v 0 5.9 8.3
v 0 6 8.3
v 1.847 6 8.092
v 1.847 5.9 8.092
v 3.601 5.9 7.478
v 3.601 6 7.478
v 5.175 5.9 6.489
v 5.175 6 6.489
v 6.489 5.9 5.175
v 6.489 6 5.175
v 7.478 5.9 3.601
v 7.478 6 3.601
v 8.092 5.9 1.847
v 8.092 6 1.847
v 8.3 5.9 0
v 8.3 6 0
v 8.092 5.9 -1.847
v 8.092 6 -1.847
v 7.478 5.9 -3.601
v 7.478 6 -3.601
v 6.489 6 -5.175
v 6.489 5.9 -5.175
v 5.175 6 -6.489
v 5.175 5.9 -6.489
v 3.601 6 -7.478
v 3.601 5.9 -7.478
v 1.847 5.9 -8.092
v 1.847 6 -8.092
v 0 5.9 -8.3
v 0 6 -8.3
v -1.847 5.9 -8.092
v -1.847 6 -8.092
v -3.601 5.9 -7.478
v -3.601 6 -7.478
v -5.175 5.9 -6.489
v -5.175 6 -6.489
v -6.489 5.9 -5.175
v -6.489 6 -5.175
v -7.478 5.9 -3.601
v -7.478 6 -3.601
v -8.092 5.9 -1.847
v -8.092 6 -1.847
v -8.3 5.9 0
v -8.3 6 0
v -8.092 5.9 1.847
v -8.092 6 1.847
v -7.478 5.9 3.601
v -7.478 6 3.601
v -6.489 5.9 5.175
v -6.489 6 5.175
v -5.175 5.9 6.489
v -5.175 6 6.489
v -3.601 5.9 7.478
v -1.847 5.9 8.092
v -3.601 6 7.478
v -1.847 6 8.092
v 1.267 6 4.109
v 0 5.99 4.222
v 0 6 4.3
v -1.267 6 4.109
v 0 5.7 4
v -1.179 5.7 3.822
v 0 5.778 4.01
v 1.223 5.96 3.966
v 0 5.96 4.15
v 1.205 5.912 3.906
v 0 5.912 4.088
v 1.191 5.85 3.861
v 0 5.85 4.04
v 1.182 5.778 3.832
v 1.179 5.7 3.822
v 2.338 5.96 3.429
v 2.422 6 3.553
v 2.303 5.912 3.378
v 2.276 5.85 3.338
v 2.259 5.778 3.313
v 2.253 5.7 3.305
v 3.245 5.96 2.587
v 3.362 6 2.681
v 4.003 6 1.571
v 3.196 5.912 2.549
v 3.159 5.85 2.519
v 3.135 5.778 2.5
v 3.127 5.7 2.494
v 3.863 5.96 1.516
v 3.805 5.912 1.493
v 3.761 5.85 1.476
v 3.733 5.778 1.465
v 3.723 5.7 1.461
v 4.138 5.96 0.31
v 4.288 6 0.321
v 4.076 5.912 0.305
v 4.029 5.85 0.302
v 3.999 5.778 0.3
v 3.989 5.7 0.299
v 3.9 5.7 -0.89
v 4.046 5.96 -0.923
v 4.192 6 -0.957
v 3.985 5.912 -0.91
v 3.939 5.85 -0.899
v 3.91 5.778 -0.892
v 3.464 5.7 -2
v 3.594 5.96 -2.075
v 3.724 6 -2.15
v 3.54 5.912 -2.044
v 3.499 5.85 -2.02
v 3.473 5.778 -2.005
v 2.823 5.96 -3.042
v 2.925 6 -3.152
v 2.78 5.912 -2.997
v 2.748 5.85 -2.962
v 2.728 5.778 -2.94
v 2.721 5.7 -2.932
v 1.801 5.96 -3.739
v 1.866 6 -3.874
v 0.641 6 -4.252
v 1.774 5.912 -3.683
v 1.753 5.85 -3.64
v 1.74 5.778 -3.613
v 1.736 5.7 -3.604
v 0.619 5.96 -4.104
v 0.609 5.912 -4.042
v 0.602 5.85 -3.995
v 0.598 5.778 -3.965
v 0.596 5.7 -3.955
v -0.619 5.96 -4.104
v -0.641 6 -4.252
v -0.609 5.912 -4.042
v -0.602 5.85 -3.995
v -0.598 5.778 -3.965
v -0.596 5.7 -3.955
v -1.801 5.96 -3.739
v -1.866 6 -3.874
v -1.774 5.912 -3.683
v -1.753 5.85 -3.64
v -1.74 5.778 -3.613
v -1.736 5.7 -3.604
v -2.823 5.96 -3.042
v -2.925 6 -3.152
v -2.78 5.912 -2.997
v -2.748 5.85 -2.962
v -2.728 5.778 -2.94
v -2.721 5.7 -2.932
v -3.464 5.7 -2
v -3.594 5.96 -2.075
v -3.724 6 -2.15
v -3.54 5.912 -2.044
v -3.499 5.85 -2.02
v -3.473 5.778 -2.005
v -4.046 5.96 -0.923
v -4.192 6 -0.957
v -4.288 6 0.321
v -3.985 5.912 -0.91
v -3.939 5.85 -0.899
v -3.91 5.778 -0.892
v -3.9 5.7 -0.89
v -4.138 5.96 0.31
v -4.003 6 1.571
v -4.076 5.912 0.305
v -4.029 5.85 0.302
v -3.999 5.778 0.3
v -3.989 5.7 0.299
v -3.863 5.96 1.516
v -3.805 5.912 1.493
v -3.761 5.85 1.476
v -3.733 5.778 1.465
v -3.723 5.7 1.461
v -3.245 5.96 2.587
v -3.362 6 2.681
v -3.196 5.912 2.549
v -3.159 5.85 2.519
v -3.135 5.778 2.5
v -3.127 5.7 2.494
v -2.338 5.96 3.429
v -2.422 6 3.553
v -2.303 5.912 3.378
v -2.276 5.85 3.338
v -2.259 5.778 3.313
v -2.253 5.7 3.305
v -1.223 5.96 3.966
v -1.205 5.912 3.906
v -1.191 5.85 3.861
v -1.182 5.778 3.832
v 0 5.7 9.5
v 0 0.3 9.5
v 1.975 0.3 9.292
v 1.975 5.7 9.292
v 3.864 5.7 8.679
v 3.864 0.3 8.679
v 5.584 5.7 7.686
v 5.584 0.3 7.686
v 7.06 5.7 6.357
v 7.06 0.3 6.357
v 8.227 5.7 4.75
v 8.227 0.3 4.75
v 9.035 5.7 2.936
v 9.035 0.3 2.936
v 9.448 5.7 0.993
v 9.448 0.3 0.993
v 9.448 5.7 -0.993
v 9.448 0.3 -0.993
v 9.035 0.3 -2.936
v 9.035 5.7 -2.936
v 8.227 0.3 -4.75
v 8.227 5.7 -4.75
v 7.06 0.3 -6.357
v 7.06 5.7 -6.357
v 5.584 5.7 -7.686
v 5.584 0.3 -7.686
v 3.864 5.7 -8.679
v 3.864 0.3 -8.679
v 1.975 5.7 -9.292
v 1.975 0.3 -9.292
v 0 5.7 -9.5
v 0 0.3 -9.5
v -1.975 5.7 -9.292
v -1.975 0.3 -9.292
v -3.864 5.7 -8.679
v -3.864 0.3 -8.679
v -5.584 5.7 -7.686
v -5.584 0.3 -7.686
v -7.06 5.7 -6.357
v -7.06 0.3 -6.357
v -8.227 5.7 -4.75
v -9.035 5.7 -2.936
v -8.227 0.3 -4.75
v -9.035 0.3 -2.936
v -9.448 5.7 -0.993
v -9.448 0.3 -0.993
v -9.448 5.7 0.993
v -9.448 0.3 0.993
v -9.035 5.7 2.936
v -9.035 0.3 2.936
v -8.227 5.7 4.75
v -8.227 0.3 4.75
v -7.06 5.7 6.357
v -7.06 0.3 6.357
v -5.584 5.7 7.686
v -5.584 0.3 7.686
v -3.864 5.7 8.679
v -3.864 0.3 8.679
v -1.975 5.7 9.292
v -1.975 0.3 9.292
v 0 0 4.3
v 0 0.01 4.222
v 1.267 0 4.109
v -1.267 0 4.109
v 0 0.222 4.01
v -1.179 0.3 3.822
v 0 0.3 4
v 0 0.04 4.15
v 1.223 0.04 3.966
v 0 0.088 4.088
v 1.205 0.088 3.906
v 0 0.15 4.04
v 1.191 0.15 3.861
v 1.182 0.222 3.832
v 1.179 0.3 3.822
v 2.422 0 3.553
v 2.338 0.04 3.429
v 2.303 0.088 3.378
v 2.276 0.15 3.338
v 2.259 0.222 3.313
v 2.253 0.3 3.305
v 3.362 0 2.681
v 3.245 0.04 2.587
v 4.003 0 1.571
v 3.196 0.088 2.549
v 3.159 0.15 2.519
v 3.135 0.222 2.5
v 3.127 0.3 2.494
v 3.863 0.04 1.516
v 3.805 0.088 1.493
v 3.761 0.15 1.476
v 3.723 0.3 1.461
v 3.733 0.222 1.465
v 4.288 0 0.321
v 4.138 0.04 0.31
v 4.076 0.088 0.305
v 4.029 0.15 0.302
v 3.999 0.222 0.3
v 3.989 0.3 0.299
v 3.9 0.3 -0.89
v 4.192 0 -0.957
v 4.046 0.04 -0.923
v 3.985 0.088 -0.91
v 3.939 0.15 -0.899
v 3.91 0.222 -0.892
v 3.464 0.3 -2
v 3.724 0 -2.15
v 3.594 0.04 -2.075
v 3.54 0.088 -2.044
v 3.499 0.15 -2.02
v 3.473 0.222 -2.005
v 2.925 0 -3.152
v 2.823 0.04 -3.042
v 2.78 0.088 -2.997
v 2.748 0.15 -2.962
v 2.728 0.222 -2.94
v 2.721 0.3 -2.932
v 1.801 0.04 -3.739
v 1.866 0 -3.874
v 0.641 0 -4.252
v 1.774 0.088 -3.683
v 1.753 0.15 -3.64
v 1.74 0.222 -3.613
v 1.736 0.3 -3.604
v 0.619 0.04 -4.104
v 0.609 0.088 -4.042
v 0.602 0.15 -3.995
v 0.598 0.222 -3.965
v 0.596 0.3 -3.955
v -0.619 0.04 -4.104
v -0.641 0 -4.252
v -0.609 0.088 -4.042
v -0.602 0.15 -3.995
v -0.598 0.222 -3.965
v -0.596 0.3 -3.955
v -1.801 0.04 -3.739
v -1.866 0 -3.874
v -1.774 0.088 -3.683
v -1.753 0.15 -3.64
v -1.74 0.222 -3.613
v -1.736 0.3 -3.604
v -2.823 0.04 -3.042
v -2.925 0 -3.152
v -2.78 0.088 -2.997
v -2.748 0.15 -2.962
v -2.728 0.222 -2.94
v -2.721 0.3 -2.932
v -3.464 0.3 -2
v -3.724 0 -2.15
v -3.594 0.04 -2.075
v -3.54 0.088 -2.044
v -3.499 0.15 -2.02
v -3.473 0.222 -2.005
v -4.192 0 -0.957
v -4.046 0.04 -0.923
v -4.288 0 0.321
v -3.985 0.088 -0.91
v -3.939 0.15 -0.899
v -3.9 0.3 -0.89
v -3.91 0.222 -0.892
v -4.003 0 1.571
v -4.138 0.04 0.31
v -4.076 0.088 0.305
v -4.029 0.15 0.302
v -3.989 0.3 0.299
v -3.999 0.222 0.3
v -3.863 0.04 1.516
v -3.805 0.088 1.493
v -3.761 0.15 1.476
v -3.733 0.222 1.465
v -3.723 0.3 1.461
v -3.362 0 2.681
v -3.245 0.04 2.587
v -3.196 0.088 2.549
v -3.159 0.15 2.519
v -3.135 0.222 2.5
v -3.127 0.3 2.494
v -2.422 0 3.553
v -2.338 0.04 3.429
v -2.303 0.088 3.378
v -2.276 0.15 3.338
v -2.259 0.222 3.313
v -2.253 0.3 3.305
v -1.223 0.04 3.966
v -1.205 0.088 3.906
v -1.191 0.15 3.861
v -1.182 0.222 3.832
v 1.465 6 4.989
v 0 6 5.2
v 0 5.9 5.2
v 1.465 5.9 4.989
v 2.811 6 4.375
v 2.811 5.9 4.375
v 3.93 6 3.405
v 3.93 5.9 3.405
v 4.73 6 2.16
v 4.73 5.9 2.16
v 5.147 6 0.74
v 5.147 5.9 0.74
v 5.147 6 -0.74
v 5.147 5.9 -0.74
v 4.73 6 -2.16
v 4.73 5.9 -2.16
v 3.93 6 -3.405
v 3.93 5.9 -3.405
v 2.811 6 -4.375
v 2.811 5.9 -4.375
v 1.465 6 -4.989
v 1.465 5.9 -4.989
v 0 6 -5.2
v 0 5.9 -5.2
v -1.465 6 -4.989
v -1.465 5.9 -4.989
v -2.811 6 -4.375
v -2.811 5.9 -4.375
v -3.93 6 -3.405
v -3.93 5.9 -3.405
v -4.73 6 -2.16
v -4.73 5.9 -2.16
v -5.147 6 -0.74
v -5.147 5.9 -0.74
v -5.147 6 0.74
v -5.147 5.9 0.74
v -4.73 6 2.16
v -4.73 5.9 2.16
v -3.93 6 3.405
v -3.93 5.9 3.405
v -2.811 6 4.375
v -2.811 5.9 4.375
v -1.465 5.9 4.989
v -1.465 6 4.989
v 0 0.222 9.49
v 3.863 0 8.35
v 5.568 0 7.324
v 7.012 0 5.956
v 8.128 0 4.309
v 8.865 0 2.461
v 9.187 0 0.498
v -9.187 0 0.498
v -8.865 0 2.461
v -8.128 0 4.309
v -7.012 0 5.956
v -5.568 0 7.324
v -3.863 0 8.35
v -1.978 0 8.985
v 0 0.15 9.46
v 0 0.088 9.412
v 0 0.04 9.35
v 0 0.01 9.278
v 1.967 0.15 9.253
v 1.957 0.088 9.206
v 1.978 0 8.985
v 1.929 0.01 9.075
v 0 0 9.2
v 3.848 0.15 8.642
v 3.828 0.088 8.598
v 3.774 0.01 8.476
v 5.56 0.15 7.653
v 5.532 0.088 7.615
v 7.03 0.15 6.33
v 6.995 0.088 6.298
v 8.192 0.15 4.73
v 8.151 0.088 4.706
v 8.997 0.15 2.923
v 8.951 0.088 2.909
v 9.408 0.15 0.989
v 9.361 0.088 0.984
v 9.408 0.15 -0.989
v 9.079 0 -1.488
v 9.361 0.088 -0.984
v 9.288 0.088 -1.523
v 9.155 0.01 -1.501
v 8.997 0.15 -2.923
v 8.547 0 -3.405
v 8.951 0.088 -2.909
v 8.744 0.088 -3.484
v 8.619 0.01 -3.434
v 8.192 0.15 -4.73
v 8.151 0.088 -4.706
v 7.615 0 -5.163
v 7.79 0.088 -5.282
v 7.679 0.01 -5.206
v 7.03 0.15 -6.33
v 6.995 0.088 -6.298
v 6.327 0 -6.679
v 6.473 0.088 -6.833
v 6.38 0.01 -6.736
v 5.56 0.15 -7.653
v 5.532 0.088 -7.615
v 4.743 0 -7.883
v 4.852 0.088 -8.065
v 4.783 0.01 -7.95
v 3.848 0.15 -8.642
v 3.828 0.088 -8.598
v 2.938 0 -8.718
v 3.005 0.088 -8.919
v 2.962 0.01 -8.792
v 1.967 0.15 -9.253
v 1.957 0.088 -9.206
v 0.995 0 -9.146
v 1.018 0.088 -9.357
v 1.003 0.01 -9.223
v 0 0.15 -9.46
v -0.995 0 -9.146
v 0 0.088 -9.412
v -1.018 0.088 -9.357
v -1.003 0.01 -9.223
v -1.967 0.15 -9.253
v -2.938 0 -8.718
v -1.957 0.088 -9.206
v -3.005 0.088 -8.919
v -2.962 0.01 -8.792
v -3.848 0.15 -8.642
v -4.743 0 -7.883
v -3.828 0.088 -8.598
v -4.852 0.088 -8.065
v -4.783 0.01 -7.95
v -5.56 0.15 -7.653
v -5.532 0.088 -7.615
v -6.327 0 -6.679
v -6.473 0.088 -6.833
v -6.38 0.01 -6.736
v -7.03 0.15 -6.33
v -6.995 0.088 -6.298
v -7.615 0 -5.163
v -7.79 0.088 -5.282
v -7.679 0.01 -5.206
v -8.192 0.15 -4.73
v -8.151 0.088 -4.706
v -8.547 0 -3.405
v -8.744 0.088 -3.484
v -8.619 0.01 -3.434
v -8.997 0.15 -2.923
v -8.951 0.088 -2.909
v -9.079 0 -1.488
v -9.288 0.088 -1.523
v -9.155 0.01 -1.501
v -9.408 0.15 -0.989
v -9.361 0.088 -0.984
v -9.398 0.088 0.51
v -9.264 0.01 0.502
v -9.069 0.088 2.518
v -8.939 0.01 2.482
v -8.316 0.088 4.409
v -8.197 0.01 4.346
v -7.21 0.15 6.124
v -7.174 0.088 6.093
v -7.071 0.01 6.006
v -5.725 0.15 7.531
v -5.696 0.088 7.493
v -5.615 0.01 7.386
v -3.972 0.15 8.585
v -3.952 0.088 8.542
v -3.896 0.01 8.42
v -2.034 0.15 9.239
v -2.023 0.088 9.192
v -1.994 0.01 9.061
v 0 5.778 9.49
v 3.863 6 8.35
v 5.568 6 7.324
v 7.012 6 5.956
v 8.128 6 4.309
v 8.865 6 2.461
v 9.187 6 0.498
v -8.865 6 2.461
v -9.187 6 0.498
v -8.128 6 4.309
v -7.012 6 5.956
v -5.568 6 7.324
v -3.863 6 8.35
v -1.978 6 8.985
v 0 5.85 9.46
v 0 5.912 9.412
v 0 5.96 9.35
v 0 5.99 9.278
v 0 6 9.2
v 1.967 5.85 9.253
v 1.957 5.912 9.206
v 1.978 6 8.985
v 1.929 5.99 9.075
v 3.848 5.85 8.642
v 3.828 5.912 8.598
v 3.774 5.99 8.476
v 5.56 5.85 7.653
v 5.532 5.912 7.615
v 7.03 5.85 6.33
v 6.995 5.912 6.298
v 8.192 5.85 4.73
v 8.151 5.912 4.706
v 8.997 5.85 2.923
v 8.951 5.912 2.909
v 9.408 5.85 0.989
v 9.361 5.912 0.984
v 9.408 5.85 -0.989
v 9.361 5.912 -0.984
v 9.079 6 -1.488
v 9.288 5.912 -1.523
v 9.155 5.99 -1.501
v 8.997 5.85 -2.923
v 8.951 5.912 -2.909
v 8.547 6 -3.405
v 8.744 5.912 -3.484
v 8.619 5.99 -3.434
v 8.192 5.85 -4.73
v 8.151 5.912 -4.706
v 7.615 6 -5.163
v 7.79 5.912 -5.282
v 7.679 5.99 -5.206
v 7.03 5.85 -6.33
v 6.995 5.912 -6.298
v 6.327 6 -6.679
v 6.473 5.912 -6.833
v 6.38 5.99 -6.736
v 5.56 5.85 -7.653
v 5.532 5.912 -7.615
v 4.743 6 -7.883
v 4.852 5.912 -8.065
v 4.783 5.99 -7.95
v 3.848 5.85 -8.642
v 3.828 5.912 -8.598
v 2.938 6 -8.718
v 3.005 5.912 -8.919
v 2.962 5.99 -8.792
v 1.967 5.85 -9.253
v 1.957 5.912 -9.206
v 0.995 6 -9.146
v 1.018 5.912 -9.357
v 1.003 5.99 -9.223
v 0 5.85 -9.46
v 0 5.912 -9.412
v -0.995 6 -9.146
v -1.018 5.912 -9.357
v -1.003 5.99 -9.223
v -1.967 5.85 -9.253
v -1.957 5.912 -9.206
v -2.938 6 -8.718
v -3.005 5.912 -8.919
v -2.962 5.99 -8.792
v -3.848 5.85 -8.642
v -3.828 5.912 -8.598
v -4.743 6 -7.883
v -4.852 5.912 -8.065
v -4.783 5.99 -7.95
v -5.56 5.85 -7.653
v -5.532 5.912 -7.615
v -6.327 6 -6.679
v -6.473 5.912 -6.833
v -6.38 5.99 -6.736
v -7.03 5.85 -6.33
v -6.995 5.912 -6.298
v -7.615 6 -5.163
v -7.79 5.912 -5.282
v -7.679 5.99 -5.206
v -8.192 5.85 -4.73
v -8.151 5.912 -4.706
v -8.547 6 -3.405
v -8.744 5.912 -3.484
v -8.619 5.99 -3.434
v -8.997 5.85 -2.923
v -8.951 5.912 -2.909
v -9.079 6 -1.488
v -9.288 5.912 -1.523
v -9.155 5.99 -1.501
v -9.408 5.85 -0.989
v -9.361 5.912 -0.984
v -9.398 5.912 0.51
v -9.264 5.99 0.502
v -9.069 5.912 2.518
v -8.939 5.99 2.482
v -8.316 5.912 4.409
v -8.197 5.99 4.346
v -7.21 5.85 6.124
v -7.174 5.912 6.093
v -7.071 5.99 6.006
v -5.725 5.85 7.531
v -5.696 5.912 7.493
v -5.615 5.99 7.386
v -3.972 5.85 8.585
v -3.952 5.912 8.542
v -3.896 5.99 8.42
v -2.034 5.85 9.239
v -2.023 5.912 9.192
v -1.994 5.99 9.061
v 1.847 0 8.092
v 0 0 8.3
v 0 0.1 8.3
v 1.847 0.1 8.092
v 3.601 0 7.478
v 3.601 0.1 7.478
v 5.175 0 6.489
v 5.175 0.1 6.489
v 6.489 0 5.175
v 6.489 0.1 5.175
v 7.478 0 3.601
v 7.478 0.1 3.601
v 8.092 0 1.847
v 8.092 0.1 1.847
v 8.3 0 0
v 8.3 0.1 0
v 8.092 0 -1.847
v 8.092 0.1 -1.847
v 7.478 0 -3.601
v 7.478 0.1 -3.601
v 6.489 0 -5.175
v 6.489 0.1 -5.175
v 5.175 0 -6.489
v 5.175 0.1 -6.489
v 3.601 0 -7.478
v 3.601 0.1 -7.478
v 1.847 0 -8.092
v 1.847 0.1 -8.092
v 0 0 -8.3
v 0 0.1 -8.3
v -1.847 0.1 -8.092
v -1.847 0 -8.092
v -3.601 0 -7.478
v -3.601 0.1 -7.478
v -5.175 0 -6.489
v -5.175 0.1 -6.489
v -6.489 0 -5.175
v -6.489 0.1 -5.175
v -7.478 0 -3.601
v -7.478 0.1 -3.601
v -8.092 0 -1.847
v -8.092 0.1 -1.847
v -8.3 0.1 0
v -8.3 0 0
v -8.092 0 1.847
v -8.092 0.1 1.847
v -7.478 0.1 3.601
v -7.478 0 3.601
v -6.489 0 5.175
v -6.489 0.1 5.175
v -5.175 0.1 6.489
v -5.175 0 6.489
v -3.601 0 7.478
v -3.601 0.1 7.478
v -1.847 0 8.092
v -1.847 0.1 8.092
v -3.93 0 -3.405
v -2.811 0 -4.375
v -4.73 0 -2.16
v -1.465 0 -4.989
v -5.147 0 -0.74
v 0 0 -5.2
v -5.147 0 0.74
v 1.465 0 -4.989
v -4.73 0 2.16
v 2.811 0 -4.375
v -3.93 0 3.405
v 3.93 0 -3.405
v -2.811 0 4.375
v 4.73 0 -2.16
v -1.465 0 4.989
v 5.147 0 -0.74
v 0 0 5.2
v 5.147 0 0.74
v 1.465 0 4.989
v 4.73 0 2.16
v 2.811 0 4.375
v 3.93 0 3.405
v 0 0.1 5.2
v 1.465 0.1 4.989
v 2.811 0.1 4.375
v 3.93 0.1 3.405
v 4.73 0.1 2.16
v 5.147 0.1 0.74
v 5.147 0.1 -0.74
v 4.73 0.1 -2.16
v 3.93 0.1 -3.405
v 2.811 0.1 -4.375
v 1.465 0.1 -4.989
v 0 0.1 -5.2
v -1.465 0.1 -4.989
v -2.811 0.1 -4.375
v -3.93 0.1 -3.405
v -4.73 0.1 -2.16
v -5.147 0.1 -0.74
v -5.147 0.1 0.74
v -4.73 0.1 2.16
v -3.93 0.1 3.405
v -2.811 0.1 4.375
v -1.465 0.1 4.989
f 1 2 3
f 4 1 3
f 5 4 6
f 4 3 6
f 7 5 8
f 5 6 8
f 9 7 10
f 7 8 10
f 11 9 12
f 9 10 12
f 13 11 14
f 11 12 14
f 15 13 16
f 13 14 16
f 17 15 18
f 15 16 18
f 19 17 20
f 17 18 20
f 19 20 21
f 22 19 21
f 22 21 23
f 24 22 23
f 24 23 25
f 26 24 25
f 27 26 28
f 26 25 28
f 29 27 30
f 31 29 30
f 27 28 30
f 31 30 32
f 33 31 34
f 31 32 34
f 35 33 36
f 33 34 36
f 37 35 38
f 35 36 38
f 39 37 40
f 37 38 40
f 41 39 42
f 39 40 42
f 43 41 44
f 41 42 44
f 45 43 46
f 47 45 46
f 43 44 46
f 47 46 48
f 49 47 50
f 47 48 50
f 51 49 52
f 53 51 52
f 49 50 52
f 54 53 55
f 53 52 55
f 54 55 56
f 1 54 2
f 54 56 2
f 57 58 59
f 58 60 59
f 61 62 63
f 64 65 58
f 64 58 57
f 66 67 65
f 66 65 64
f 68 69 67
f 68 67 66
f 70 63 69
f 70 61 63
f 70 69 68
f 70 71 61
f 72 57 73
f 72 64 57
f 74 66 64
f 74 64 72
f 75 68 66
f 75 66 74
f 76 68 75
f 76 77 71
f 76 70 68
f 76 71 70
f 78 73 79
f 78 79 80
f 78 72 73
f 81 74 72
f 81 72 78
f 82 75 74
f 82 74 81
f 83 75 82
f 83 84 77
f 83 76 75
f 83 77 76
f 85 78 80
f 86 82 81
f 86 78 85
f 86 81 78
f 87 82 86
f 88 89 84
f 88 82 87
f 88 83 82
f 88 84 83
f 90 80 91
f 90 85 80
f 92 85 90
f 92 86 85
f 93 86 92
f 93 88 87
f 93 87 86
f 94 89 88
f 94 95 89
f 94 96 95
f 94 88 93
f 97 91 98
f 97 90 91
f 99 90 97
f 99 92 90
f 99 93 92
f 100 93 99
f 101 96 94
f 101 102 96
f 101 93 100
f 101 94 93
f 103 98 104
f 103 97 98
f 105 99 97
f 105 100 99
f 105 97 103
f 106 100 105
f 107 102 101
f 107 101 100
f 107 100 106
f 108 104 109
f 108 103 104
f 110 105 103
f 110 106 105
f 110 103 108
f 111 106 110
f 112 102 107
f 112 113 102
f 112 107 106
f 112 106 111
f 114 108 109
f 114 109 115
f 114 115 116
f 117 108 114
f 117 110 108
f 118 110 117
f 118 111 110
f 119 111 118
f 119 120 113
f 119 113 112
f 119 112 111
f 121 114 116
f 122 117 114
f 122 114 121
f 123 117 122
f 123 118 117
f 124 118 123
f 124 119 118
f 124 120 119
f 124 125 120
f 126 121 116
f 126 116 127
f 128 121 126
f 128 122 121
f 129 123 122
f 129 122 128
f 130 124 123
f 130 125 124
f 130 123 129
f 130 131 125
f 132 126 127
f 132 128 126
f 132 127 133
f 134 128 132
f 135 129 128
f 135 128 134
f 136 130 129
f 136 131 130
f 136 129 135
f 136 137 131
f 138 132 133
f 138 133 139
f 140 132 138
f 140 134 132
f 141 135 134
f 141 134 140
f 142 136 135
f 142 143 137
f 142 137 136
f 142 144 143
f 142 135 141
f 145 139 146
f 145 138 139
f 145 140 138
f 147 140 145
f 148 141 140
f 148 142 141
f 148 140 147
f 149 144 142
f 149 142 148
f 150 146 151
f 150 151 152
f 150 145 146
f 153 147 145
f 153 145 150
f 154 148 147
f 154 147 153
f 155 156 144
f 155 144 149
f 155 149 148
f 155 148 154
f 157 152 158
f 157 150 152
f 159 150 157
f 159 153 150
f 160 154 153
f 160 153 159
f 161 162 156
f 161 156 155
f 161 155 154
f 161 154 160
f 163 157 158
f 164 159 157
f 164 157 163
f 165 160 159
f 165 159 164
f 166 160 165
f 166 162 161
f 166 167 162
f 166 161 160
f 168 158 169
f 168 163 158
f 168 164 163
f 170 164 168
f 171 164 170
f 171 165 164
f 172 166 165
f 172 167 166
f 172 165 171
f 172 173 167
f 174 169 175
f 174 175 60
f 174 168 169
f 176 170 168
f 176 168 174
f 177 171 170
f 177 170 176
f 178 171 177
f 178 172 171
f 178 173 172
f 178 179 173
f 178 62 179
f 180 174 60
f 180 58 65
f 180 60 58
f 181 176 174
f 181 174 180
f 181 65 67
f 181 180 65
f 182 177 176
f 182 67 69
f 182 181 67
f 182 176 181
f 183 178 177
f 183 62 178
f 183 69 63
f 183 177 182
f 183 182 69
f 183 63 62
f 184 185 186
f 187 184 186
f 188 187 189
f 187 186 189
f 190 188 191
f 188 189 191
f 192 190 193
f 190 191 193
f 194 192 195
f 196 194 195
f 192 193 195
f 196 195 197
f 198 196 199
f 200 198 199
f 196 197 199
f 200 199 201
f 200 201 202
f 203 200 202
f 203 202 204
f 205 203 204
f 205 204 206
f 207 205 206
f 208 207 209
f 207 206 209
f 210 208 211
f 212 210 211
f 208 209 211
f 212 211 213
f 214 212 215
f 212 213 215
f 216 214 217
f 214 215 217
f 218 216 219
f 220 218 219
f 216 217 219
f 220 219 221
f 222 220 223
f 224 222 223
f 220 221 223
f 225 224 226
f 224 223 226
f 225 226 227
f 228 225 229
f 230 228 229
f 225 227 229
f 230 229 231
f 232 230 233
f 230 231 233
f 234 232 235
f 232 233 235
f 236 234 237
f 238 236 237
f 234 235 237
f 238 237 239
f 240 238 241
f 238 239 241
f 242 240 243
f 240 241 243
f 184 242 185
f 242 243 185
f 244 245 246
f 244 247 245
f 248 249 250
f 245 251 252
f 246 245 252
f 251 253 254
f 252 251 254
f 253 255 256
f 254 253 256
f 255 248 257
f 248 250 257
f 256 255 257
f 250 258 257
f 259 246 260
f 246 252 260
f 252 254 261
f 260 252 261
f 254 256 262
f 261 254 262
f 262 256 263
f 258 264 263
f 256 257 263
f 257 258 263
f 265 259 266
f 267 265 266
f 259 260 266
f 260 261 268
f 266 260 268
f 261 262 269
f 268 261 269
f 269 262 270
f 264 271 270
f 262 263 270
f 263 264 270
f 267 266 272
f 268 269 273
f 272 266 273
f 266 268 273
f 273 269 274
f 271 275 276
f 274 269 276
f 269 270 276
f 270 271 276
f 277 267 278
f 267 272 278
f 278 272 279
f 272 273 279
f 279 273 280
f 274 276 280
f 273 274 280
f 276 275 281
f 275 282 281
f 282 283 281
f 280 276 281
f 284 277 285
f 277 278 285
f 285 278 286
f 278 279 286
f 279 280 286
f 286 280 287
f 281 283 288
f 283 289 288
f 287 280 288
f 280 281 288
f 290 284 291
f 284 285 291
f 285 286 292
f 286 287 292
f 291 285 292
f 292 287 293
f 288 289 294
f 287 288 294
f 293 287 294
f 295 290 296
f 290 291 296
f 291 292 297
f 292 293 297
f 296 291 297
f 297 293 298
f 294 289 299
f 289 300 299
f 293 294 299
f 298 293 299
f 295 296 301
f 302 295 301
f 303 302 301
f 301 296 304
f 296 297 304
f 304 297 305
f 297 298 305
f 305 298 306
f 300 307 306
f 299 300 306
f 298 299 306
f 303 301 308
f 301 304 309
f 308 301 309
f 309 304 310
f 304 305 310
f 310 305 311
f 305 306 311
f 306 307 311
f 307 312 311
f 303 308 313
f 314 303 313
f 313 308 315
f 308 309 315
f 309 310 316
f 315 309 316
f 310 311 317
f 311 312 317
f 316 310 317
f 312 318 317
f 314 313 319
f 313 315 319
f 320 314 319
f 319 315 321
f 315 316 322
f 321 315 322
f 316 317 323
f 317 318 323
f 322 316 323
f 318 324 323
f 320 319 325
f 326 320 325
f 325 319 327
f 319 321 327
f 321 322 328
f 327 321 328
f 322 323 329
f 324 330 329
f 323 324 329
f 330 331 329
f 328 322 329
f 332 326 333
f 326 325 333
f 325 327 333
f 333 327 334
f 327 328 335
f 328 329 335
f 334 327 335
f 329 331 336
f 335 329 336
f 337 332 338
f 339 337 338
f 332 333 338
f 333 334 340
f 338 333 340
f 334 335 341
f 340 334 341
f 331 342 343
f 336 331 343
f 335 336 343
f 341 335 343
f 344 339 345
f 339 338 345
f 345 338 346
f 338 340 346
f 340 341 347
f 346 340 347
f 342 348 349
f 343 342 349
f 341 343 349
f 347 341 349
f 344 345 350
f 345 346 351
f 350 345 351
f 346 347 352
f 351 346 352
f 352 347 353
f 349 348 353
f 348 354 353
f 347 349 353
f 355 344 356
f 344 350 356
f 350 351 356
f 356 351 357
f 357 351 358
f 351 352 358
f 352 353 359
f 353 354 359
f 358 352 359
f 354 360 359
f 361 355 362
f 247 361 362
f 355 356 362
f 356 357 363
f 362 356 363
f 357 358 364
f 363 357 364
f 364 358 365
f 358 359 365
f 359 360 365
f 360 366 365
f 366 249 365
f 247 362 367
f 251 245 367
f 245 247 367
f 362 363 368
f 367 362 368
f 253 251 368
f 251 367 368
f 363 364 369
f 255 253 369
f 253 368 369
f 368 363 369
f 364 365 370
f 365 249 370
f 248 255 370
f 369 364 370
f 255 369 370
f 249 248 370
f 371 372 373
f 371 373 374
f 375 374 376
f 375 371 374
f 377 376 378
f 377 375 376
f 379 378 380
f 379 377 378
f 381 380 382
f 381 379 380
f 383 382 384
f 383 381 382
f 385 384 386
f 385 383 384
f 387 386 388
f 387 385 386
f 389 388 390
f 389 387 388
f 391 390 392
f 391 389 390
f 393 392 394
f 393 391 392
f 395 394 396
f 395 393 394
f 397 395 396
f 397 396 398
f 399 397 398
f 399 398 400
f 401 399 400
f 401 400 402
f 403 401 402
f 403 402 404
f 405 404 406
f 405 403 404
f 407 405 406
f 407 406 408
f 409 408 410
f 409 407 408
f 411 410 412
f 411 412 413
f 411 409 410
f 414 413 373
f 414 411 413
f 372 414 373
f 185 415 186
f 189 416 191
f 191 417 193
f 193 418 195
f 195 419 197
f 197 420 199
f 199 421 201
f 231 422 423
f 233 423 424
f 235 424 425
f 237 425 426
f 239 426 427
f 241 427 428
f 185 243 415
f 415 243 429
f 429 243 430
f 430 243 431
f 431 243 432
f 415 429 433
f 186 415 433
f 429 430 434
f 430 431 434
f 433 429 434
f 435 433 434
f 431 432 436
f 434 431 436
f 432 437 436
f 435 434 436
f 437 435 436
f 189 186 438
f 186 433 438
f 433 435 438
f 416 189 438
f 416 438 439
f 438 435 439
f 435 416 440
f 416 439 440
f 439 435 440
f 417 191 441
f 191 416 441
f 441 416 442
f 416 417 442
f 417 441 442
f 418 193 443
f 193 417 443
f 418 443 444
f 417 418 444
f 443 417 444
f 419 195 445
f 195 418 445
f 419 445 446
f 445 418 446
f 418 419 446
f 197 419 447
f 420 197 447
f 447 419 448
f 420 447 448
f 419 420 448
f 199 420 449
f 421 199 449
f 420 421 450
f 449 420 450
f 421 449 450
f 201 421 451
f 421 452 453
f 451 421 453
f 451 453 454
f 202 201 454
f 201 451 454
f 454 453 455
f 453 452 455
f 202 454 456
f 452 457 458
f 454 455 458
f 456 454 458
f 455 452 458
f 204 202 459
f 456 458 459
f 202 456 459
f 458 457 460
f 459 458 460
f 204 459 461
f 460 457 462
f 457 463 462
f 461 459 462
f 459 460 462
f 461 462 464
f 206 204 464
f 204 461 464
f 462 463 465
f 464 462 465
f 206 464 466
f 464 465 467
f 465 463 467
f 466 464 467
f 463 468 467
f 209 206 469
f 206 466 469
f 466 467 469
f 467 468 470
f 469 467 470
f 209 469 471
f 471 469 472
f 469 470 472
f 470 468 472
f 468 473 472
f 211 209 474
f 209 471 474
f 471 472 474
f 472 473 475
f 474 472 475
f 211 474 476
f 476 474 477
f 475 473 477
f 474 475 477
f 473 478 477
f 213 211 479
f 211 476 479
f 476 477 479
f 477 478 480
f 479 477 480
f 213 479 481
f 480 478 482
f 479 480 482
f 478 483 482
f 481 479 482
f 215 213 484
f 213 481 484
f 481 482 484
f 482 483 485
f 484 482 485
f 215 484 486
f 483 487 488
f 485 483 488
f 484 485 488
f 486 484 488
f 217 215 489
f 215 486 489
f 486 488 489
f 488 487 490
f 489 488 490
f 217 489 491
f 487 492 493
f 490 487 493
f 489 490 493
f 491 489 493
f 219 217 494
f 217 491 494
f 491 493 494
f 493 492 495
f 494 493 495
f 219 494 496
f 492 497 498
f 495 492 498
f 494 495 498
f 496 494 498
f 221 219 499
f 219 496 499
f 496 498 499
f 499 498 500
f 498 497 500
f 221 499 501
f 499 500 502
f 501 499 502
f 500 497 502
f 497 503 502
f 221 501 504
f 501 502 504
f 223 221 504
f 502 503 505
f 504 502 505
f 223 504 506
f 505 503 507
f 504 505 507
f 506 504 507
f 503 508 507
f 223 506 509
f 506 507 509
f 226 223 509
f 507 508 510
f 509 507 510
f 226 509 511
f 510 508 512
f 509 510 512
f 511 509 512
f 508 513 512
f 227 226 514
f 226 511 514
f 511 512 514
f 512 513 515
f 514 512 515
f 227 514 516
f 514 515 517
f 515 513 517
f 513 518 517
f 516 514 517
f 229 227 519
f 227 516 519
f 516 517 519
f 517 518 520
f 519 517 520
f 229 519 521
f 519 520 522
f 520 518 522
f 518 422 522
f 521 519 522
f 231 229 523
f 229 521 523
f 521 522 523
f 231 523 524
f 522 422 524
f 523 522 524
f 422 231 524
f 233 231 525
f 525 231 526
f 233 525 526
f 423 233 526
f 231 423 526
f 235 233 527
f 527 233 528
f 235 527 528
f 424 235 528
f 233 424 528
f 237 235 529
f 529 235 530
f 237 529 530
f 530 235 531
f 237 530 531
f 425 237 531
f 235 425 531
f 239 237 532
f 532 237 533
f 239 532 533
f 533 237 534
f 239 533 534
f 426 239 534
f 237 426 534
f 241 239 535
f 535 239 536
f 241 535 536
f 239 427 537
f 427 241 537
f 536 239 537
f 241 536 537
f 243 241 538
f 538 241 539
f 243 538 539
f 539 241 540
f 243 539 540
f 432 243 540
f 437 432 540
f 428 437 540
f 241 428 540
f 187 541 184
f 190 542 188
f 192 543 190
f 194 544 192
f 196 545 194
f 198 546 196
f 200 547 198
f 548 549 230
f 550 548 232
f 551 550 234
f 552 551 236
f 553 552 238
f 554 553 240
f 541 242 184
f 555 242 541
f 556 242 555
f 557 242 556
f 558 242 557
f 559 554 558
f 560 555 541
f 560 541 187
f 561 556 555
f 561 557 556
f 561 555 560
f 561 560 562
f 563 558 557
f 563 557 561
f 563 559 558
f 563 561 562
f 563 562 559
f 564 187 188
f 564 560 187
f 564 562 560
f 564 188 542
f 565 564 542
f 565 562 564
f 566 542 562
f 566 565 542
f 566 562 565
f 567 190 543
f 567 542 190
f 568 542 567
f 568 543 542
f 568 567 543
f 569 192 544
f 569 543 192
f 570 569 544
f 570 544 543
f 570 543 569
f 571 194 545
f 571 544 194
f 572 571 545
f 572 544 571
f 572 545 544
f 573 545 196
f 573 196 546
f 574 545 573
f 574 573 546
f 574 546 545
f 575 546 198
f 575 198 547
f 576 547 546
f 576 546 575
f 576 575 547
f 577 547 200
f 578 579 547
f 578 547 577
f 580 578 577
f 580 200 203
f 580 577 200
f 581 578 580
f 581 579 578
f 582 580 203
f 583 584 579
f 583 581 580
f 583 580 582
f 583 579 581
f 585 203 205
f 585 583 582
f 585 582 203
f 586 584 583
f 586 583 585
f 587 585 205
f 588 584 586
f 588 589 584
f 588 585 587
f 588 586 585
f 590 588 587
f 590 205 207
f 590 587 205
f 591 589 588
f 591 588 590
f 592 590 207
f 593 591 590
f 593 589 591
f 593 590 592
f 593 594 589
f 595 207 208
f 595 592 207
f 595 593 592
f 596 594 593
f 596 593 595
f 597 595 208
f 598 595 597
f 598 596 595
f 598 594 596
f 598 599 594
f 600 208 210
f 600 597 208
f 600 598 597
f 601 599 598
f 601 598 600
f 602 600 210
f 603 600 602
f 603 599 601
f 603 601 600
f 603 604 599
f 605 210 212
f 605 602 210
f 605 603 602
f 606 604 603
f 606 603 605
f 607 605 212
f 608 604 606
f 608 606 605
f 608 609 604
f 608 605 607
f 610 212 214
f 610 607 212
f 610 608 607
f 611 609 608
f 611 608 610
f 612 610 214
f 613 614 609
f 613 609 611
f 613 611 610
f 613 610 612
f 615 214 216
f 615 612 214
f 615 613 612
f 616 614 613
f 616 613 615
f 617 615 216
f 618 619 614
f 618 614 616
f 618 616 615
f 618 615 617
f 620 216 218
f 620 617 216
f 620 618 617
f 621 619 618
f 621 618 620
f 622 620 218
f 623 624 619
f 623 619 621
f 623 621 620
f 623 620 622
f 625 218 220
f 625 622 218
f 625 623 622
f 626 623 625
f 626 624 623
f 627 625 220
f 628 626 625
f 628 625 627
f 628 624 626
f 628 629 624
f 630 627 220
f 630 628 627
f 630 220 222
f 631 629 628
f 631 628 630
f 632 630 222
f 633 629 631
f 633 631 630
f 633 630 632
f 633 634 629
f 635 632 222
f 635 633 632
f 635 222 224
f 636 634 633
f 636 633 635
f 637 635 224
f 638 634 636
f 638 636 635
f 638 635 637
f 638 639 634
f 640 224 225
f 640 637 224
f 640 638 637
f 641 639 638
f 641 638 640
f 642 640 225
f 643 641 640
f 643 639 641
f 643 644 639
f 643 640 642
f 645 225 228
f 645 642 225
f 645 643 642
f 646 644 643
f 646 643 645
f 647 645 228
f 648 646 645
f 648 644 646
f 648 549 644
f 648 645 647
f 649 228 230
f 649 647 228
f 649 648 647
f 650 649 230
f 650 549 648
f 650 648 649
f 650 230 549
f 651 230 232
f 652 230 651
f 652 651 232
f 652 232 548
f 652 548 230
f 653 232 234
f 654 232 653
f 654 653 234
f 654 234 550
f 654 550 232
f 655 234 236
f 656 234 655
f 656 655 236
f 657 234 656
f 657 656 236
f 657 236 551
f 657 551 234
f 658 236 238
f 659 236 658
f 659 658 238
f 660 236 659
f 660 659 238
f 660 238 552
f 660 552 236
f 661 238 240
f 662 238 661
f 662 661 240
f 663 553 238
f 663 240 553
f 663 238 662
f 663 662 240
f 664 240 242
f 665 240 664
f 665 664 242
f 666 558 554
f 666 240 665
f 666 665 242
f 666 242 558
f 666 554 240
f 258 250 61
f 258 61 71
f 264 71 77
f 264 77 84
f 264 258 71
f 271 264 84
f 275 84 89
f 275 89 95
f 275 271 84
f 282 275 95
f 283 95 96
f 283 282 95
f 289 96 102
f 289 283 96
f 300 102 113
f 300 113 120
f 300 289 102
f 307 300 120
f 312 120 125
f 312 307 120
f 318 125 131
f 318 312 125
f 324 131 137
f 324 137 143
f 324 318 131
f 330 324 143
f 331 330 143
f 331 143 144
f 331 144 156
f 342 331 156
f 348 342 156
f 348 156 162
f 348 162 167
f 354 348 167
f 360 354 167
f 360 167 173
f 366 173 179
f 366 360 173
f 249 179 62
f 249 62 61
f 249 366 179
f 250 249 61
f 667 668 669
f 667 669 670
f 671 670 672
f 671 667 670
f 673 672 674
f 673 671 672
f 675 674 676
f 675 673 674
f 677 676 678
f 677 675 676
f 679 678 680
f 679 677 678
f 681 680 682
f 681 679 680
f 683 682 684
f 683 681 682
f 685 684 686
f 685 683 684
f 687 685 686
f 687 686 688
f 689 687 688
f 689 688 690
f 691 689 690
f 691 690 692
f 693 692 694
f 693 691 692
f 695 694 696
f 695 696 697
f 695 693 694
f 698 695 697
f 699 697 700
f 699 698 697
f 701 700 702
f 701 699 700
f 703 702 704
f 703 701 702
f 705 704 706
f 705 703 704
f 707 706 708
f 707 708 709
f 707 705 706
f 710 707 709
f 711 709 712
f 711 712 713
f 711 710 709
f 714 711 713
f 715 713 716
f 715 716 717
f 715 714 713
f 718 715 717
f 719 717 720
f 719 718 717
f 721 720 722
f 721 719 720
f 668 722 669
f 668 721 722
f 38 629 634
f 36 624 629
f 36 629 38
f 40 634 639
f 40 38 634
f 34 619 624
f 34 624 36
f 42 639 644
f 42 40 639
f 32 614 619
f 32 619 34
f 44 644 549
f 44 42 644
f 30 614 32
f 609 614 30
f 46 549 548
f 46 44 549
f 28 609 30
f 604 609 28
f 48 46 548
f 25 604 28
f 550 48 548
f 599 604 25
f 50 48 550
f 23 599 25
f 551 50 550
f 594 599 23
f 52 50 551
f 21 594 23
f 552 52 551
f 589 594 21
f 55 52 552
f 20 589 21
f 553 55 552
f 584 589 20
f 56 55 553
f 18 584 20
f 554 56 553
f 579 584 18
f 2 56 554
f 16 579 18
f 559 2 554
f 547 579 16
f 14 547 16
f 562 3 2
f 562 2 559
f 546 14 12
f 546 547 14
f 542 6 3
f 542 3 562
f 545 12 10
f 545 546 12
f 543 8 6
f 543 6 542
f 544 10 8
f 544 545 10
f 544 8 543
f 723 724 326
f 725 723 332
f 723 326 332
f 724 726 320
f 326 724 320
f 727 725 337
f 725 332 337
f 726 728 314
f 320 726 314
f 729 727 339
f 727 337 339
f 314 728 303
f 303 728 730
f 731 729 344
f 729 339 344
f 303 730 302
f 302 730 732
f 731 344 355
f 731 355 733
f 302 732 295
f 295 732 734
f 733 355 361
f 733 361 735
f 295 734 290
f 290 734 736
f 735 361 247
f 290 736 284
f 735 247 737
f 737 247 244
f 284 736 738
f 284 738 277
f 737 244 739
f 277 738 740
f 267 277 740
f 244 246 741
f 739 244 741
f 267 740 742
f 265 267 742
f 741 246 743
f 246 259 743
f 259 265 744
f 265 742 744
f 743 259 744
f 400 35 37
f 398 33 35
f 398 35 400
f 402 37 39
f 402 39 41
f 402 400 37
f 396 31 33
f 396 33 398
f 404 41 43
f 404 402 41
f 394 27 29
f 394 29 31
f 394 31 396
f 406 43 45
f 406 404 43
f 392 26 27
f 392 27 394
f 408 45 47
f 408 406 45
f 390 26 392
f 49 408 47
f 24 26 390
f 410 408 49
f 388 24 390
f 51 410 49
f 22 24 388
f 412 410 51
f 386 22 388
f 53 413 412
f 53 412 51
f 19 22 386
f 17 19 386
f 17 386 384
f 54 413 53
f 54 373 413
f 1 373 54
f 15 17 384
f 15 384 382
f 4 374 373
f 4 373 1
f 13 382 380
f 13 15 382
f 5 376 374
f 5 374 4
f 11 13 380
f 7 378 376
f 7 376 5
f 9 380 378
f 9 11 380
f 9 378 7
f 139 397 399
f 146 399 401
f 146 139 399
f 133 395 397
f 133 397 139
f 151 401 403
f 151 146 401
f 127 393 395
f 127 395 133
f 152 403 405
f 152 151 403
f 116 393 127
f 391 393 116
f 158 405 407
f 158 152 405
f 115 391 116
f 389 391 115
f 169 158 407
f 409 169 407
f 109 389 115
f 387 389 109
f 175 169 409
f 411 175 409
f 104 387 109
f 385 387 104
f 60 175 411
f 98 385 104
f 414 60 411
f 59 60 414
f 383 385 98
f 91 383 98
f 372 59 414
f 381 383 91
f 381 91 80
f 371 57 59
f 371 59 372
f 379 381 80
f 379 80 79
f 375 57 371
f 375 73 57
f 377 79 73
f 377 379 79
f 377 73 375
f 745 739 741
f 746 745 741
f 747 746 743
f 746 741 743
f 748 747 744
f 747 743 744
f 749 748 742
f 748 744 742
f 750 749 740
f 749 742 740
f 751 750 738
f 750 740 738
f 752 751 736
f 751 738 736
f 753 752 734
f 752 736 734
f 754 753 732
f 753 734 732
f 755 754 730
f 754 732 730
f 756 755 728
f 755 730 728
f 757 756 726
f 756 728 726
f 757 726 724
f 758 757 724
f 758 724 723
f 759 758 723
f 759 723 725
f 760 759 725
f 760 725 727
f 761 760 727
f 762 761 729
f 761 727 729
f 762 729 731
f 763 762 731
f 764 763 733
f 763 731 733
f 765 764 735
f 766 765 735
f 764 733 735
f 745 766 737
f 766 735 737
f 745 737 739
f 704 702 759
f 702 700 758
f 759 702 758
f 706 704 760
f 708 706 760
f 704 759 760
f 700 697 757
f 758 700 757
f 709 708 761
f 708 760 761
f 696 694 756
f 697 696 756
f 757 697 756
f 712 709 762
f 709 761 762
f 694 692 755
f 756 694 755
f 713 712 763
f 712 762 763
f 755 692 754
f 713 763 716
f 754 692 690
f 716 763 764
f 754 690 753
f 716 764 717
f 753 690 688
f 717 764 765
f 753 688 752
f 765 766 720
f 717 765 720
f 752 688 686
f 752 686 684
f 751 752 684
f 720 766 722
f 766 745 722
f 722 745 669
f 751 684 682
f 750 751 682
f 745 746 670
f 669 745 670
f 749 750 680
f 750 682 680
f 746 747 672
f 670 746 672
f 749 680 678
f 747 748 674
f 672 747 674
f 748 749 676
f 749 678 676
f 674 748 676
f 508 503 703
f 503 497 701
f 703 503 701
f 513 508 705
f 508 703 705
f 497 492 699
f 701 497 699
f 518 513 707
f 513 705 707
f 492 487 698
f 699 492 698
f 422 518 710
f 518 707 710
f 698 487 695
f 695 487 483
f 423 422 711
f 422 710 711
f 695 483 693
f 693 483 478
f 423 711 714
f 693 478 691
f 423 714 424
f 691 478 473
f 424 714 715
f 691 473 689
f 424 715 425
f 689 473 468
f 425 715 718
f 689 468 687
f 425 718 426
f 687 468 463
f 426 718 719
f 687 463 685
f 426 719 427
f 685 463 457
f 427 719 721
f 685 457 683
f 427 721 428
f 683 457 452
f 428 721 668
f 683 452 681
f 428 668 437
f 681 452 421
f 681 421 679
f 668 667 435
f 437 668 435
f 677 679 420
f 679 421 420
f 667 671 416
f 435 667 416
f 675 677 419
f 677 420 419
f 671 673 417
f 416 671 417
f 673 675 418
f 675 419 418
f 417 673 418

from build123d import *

# Parameters (mm, degrees)
CROQUIS1_R              = 9.5
CROQUIS1_R_2            = 4
SALIENTE_EXTRUIR1_DEPTH = 6
CROQUIS2_R              = 8.3
CROQUIS2_R_2            = 5.2
CORTAR_EXTRUIR1_DEPTH   = 0.1
REDONDEO1_R             = 0.3


with BuildPart() as part:
    # Croquis1 → Saliente-Extruir1 (new body)
    with BuildSketch(Plane(origin=(0, 0, 0), x_dir=(1, 0, 0), z_dir=(0, 1, 0))):
        with Locations(Location((0, 0, 0), (0, 0, 270))):
            Circle(CROQUIS1_R)
        with Locations(Location((0, 0, 0), (0, 0, 270))):
            Circle(CROQUIS1_R_2, mode=Mode.SUBTRACT)
    extrude(amount=SALIENTE_EXTRUIR1_DEPTH)

    # Croquis2 → Cortar-Extruir1 (cut)
    with BuildSketch(Plane(origin=(0, 6, 0), x_dir=(1, 0, 0), z_dir=(0, 1, 0))):
        with Locations(Location((0, 0, 0), (0, 0, 270))):
            Circle(CROQUIS2_R)
        with Locations(Location((0, 0, 0), (0, 0, 270))):
            Circle(CROQUIS2_R_2, mode=Mode.SUBTRACT)
    cortar_extruir1 = extrude(amount=-CORTAR_EXTRUIR1_DEPTH, mode=Mode.SUBTRACT)

    # Simetría1: Cortar-Extruir1 across plane
    add(cortar_extruir1.mirror(Plane.ZX.offset(3)), mode=Mode.SUBTRACT)

    # Redondeo1
    redondeo1_edges = [part.edges().sort_by_distance(p)[0] for p in [
        (0, 0, -9.5),
        (0, 6, -9.5),
        (0, 0, -4),
        (0, 6, -4),
    ]]
    fillet(redondeo1_edges, radius=REDONDEO1_R)


solid = part.part
